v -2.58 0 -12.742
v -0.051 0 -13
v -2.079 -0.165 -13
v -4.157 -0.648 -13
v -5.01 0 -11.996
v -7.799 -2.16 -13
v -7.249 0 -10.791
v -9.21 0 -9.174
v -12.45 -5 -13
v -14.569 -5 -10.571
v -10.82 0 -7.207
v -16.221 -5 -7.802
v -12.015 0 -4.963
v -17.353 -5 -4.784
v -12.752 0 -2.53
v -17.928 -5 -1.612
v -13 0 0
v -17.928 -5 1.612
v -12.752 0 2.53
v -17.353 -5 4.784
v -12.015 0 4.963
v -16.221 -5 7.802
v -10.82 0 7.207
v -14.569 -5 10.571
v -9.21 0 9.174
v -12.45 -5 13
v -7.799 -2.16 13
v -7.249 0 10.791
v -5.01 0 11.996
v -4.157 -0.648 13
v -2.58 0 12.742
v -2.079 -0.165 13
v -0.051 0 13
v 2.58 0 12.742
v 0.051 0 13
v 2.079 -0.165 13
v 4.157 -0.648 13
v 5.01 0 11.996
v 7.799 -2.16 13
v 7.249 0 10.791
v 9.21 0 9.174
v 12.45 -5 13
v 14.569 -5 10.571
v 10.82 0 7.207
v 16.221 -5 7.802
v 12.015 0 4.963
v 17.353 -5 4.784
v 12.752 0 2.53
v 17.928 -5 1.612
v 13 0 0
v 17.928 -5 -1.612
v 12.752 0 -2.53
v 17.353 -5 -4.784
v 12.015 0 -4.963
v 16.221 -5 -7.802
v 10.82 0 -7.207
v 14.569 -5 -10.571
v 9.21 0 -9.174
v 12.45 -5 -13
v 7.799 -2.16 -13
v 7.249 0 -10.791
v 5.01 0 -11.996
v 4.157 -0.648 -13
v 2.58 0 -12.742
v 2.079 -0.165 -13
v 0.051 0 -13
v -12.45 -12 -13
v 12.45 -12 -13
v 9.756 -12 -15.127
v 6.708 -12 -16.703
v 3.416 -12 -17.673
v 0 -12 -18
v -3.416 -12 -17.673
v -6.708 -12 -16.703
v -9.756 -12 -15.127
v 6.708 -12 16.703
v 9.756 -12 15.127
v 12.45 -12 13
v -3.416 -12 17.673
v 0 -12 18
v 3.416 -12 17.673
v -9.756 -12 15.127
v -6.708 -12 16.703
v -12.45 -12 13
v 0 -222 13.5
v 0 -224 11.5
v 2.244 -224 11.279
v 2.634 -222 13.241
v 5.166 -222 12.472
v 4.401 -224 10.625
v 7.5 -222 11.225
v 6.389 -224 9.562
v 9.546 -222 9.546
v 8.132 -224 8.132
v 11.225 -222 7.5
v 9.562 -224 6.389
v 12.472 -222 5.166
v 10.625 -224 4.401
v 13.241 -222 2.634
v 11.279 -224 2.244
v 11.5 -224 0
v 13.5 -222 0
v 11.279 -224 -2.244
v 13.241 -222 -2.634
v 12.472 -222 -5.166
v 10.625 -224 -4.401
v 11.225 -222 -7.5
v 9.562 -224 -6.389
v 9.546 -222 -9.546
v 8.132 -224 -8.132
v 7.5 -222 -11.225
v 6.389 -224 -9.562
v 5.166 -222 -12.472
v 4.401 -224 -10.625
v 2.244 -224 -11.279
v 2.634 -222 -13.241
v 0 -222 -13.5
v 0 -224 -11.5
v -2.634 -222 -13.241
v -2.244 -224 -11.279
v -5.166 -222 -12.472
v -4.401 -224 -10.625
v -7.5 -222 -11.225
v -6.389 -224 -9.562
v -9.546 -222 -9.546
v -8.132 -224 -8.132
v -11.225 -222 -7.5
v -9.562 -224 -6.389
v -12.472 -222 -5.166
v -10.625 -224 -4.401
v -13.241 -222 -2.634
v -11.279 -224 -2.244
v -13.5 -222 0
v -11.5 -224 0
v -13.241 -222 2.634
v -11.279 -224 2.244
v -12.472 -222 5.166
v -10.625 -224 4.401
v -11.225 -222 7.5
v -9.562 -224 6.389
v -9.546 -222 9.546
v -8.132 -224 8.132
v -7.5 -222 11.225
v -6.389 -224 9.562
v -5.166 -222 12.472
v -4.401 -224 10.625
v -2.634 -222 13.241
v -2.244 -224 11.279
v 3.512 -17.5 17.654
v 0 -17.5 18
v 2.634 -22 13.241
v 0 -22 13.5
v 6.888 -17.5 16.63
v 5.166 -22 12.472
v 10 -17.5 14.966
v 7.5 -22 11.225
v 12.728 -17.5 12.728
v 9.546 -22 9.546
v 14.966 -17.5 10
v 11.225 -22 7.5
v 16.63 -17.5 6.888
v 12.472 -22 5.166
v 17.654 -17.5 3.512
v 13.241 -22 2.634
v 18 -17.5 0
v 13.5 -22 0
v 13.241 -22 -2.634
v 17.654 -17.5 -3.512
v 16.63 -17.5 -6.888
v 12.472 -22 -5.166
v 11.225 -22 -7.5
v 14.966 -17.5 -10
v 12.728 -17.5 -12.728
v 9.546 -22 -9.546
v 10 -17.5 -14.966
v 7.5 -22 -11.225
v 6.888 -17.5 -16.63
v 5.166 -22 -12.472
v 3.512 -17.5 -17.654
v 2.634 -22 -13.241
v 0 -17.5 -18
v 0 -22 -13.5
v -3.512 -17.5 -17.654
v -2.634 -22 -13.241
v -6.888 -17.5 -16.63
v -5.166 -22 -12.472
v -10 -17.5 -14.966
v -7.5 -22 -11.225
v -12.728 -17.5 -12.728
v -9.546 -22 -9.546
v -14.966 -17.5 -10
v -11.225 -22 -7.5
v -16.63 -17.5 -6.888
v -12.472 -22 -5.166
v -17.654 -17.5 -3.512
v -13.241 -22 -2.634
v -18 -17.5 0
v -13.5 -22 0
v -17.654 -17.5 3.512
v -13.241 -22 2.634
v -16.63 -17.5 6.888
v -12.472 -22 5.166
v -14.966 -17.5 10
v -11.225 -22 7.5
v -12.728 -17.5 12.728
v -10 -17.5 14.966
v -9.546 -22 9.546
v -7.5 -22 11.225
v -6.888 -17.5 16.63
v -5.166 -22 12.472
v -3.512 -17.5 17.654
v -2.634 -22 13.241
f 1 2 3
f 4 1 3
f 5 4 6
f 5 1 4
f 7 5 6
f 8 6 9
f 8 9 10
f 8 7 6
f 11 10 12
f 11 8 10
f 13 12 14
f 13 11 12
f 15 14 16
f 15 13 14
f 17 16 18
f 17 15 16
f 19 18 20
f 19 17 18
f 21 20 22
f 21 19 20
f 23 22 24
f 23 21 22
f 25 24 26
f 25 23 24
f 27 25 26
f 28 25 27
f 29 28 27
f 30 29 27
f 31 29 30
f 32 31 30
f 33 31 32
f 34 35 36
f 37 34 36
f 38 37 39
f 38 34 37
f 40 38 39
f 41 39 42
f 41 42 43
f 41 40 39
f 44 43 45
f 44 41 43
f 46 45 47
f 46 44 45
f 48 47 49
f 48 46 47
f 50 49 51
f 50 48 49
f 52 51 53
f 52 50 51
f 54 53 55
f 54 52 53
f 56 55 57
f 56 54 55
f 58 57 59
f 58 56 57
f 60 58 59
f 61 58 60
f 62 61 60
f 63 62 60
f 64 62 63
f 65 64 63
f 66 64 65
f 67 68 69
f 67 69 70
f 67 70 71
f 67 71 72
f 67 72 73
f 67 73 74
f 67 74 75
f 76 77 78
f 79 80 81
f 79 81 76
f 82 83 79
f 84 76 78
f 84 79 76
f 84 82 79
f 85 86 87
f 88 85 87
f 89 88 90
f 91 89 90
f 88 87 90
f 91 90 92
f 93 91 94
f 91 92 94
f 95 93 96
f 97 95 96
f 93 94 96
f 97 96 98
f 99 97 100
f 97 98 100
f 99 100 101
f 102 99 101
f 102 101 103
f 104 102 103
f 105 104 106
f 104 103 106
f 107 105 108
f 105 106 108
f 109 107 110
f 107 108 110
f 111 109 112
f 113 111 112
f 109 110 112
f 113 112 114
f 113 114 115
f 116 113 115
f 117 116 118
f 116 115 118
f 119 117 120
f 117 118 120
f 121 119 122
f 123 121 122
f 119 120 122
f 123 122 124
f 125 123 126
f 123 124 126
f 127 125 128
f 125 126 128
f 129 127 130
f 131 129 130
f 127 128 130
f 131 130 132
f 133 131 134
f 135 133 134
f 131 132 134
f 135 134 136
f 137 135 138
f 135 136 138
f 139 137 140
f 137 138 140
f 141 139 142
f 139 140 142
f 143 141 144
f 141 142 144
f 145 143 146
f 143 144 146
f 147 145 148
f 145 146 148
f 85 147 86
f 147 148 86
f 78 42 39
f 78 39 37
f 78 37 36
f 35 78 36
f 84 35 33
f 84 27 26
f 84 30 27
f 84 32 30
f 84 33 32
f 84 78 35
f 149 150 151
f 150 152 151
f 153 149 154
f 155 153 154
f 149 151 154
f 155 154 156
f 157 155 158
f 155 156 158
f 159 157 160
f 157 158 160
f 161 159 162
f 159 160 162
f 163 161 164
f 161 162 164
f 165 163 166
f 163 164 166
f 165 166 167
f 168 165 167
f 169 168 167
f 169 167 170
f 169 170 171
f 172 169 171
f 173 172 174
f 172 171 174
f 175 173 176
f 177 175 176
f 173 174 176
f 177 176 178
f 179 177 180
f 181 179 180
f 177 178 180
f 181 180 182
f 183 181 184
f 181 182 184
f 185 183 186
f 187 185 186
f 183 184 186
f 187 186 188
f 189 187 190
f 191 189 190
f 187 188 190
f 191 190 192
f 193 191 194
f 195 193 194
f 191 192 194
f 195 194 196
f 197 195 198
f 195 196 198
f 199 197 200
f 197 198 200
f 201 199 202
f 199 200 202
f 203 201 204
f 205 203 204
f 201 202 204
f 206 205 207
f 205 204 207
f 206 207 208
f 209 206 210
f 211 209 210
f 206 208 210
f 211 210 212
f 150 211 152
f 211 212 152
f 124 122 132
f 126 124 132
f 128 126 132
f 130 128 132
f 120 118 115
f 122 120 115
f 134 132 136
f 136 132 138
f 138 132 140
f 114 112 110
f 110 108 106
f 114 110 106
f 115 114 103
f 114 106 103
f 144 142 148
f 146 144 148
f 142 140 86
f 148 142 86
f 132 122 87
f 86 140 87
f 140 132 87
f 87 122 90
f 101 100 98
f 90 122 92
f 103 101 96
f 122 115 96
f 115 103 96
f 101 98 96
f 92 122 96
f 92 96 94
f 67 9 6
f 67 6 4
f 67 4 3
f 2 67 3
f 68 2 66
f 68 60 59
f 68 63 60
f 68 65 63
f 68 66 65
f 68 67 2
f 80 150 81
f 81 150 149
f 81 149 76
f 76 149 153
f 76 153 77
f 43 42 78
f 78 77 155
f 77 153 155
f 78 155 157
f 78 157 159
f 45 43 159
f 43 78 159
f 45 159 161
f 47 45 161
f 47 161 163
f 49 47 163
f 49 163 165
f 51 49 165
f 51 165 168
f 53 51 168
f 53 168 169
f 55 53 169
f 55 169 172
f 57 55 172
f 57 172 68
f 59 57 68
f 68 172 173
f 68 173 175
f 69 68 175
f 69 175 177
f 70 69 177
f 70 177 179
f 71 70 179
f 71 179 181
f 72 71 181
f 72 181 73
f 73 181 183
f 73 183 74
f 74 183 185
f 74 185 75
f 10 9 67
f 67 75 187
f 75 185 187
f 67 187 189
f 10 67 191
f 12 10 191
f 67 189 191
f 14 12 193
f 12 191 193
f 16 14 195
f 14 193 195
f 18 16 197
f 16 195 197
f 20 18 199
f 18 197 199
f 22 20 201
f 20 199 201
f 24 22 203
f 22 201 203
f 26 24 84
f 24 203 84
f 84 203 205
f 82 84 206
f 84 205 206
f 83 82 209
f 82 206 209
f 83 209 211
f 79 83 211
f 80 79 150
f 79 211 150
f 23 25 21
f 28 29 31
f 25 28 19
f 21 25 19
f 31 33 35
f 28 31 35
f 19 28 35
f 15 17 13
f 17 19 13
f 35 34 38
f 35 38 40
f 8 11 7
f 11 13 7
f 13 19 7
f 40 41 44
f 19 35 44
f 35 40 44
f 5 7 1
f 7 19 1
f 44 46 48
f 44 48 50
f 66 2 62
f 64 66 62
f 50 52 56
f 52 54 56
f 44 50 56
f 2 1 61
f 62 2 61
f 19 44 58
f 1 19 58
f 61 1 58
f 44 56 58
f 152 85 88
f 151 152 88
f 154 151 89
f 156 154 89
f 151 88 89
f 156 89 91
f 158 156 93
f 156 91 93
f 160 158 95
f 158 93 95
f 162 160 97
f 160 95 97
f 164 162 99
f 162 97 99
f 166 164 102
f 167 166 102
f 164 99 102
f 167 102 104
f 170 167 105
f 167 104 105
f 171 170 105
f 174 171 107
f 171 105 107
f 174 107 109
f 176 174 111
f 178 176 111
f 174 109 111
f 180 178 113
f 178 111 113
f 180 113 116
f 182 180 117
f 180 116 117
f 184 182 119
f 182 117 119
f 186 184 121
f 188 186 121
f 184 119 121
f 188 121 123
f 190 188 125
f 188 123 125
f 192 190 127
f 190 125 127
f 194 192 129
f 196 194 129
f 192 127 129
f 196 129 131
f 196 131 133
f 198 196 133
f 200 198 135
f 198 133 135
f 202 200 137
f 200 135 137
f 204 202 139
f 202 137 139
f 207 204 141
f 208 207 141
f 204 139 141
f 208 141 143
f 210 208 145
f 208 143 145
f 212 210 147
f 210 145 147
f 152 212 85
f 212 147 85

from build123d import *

# Parameters (mm, degrees)
CUT_EXTRUDE_START   = -12
CUT_EXTRUDE_1_DEPTH = 12
CUT_EXTRUDE_2_DEPTH = 12
CHAMFER_1_SIZE      = 5
CHAMFER_2_SIZE      = 2


with BuildPart() as part:
    # Эскиз1 → Повернуть1 (revolve)
    with BuildSketch(Plane(origin=(0, 0, 0), x_dir=(-1, 0, 0), z_dir=(0, 0, -1)), mode=Mode.PRIVATE) as revolve_1_sk:
        Polygon((-13.5, -224), (0, -224), (0, 0), (-18, 0), (-18, -17.5), (-13.5, -22), align=None)
    revolve(revolve_1_sk.sketch.rotate(Axis((0, -224, 0), (0, 1, 0)), 270), axis=Axis((0, -224, 0), (0, 1, 0)))

    # Эскиз2 → Вырез-Вытянуть1 (cut)
    with BuildSketch(Plane(origin=(0, 0, 0), x_dir=(-1, 0, 0), z_dir=(0, 1, 0)).offset(CUT_EXTRUDE_START)):
        with BuildLine():
            Line((-12.449899598, 13), (12.449899598, 13))
            ThreePointArc((12.449899598, 13), (0, 18), (-12.449899598, 13))
        make_face()
    extrude(amount=CUT_EXTRUDE_1_DEPTH, mode=Mode.SUBTRACT)

    # Эскиз3 → Вырез-Вытянуть2 (cut)
    with BuildSketch(Plane(origin=(0, 0, 0), x_dir=(-1, 0, 0), z_dir=(0, 1, 0)).offset(CUT_EXTRUDE_START)):
        with BuildLine():
            Line((12.449899598, -13), (-12.449899598, -13))
            ThreePointArc((-12.449899598, -13), (0, -18), (12.449899598, -13))
        make_face()
    extrude(amount=CUT_EXTRUDE_2_DEPTH, mode=Mode.SUBTRACT)

    # Фаска1
    chamfer_1_edges = [part.edges().sort_by_distance(p)[0] for p in [
        (-18, 0, 0),
        (18, 0, 0),
    ]]
    chamfer(chamfer_1_edges, length=CHAMFER_1_SIZE - 0.0001)  # a hair under: the kernel refuses the full size

    # Фаска2
    chamfer_2_edges = [part.edges().sort_by_distance(p)[0] for p in [
        (0, -224, -13.5),
    ]]
    chamfer(chamfer_2_edges, length=CHAMFER_2_SIZE)


solid = part.part
